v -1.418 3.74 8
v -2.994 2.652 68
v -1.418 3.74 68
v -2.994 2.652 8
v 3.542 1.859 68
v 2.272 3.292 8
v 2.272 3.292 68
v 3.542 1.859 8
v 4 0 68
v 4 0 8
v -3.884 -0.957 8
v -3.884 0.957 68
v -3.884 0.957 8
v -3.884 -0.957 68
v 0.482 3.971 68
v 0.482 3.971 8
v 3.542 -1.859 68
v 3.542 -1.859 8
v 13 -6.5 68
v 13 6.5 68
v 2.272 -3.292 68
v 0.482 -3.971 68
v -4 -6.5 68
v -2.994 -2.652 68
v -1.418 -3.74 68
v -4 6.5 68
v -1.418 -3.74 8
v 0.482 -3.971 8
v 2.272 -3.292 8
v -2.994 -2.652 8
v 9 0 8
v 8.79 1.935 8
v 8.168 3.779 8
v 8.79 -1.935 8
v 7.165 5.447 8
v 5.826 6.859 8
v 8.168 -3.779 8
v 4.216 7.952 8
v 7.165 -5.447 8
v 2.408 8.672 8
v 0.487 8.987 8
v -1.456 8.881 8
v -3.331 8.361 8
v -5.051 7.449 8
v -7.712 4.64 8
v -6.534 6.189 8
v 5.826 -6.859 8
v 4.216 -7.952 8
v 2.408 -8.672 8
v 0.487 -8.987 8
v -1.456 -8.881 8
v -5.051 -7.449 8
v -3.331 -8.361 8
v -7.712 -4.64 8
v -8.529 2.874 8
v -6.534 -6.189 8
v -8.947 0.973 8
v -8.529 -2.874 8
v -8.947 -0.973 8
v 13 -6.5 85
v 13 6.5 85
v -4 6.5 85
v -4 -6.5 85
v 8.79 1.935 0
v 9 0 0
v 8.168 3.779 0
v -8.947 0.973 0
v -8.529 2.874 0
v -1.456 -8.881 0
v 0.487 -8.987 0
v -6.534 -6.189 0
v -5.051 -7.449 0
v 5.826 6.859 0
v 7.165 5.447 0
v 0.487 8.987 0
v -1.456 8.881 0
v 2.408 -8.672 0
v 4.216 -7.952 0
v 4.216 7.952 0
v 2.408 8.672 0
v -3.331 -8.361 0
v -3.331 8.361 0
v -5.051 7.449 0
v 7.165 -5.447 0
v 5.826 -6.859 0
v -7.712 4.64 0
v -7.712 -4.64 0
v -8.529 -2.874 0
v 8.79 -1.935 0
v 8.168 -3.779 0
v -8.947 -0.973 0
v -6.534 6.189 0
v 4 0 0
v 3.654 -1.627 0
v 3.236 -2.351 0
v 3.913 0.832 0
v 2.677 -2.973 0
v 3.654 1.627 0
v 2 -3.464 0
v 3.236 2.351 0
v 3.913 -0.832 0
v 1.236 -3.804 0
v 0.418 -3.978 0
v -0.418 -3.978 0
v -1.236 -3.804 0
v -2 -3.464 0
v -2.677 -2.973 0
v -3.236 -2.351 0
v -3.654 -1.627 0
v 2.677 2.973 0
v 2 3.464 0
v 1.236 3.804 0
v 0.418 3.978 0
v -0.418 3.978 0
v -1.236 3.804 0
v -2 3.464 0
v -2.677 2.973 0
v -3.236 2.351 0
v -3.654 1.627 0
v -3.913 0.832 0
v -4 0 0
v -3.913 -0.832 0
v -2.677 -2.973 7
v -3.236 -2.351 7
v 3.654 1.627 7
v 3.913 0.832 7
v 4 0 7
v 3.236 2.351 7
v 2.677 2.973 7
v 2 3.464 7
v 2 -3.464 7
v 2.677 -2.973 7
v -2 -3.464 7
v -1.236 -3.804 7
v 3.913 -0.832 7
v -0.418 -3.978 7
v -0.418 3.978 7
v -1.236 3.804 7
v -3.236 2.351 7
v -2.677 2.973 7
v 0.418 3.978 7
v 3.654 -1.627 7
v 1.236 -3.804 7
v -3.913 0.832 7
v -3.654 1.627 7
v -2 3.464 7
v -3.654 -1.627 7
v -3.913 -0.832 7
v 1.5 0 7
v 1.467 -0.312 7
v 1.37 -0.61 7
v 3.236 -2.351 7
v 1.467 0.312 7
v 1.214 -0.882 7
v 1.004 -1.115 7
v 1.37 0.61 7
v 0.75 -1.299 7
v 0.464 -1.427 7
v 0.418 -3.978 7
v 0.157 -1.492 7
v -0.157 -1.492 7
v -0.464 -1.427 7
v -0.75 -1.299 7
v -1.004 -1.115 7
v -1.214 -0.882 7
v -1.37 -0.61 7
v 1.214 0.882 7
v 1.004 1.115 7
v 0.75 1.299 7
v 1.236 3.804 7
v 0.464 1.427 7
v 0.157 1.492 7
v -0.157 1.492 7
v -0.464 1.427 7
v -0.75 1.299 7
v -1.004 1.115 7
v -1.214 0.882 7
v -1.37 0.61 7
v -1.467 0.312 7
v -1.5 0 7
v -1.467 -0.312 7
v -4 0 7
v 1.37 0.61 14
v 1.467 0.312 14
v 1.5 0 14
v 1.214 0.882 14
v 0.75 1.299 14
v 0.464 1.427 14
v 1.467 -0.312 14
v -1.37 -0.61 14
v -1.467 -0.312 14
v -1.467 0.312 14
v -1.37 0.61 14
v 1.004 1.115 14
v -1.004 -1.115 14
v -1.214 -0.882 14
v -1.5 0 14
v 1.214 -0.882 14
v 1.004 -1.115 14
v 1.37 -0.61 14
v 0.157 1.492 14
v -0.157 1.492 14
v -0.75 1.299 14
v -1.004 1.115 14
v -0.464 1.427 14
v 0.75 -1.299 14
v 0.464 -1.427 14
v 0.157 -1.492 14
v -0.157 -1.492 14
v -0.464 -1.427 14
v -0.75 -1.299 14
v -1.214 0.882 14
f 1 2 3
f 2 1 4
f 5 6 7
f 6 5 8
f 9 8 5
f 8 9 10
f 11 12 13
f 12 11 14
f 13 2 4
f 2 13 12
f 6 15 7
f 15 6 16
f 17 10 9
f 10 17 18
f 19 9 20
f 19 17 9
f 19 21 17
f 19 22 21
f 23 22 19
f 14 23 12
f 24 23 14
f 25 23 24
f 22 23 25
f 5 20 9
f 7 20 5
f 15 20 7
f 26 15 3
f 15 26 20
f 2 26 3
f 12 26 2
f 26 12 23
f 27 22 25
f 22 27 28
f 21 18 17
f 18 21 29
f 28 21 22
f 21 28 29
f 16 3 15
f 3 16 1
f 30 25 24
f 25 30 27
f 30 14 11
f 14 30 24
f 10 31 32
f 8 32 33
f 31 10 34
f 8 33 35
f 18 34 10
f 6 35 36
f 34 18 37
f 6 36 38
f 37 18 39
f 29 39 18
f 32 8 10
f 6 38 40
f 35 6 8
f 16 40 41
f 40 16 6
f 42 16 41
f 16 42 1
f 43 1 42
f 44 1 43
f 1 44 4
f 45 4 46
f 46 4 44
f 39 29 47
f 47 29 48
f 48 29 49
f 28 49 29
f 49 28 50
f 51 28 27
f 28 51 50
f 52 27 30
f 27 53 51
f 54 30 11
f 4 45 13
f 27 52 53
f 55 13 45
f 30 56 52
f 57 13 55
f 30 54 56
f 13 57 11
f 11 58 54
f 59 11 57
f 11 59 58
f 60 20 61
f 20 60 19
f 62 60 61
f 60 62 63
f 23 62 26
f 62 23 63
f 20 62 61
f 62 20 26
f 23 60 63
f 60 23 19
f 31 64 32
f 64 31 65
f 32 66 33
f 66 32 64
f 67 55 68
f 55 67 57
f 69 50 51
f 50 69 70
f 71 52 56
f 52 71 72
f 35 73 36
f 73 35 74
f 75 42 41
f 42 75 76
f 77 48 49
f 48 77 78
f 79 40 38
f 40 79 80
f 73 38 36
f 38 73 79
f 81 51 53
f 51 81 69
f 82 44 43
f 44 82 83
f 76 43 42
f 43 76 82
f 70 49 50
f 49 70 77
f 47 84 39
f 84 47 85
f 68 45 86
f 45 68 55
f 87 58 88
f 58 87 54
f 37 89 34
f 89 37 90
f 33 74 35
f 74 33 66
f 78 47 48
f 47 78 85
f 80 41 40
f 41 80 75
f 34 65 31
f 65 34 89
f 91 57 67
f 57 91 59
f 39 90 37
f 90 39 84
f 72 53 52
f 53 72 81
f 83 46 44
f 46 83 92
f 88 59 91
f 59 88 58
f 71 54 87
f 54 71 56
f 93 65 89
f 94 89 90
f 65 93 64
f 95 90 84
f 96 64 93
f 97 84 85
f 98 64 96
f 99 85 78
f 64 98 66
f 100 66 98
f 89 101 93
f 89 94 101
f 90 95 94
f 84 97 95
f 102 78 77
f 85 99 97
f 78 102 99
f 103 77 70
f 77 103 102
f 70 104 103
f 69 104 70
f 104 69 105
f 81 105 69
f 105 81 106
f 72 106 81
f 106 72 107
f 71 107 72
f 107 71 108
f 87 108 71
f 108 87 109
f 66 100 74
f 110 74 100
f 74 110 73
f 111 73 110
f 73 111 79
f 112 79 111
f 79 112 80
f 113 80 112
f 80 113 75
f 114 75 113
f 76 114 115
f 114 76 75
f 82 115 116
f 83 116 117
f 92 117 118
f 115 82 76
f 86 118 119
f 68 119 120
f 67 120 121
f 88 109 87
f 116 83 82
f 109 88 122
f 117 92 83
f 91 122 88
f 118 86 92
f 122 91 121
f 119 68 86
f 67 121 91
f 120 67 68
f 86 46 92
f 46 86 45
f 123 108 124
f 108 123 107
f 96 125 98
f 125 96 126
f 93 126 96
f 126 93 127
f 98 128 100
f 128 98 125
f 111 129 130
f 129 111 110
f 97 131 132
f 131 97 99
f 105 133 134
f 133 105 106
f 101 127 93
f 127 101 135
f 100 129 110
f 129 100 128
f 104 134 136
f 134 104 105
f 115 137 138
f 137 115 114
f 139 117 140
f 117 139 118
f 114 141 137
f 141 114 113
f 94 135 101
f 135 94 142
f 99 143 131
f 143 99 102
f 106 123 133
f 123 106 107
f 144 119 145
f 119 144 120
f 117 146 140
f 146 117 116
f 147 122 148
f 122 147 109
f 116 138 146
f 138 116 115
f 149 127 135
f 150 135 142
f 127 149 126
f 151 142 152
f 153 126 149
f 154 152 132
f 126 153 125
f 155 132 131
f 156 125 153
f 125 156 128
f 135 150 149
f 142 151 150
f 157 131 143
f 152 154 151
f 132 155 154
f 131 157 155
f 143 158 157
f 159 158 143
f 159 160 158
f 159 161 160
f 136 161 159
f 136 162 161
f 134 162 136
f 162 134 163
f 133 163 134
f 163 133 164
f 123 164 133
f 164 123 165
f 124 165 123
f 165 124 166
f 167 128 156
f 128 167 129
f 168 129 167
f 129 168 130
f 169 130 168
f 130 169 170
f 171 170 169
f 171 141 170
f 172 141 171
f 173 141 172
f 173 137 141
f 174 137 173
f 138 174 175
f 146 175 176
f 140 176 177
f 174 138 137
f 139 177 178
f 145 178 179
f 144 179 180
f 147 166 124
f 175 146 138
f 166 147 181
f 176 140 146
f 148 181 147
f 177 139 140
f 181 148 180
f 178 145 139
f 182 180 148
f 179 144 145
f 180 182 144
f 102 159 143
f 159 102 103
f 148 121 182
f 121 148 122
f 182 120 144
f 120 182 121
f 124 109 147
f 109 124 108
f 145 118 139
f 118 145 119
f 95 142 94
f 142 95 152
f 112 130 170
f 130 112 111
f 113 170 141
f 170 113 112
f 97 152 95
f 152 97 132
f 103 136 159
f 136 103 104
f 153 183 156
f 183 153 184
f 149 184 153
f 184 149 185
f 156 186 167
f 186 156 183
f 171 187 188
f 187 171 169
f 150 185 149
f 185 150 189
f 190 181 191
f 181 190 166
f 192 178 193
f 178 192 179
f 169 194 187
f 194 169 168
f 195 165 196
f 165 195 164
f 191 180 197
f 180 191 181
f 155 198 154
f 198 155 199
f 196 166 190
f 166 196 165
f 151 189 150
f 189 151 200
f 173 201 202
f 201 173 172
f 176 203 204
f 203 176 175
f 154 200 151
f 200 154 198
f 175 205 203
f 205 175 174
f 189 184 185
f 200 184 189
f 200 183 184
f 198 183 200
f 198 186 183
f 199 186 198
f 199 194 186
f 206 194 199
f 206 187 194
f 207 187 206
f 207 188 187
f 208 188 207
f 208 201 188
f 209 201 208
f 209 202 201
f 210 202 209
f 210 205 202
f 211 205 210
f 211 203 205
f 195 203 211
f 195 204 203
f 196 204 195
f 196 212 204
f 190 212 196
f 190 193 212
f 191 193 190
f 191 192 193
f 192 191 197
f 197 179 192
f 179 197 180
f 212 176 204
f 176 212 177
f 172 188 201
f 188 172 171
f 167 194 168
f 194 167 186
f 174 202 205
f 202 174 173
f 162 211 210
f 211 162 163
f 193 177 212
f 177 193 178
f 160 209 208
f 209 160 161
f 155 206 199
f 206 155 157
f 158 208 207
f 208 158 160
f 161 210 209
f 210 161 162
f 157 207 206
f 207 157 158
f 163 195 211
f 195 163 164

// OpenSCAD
module brushEndingModel()
{
  difference()
  {
    // main element's shape
    union()
    {
      cylinder(h=8, r=18/2);
      translate([0,0,8])
      {
        cylinder(r=8/2, h=60);
        translate([0,0,60] + [-8/2,-13/2,0])
          cube([17,13,17]);
      }
    }
    // cut-in for the mount
    cylinder(h=7, r=8/2, $fs=0.01);
    translate([0,0,7])
      cylinder(r=3/2, h=14-7, $fs=0.01);
  }
}

brushEndingModel();
